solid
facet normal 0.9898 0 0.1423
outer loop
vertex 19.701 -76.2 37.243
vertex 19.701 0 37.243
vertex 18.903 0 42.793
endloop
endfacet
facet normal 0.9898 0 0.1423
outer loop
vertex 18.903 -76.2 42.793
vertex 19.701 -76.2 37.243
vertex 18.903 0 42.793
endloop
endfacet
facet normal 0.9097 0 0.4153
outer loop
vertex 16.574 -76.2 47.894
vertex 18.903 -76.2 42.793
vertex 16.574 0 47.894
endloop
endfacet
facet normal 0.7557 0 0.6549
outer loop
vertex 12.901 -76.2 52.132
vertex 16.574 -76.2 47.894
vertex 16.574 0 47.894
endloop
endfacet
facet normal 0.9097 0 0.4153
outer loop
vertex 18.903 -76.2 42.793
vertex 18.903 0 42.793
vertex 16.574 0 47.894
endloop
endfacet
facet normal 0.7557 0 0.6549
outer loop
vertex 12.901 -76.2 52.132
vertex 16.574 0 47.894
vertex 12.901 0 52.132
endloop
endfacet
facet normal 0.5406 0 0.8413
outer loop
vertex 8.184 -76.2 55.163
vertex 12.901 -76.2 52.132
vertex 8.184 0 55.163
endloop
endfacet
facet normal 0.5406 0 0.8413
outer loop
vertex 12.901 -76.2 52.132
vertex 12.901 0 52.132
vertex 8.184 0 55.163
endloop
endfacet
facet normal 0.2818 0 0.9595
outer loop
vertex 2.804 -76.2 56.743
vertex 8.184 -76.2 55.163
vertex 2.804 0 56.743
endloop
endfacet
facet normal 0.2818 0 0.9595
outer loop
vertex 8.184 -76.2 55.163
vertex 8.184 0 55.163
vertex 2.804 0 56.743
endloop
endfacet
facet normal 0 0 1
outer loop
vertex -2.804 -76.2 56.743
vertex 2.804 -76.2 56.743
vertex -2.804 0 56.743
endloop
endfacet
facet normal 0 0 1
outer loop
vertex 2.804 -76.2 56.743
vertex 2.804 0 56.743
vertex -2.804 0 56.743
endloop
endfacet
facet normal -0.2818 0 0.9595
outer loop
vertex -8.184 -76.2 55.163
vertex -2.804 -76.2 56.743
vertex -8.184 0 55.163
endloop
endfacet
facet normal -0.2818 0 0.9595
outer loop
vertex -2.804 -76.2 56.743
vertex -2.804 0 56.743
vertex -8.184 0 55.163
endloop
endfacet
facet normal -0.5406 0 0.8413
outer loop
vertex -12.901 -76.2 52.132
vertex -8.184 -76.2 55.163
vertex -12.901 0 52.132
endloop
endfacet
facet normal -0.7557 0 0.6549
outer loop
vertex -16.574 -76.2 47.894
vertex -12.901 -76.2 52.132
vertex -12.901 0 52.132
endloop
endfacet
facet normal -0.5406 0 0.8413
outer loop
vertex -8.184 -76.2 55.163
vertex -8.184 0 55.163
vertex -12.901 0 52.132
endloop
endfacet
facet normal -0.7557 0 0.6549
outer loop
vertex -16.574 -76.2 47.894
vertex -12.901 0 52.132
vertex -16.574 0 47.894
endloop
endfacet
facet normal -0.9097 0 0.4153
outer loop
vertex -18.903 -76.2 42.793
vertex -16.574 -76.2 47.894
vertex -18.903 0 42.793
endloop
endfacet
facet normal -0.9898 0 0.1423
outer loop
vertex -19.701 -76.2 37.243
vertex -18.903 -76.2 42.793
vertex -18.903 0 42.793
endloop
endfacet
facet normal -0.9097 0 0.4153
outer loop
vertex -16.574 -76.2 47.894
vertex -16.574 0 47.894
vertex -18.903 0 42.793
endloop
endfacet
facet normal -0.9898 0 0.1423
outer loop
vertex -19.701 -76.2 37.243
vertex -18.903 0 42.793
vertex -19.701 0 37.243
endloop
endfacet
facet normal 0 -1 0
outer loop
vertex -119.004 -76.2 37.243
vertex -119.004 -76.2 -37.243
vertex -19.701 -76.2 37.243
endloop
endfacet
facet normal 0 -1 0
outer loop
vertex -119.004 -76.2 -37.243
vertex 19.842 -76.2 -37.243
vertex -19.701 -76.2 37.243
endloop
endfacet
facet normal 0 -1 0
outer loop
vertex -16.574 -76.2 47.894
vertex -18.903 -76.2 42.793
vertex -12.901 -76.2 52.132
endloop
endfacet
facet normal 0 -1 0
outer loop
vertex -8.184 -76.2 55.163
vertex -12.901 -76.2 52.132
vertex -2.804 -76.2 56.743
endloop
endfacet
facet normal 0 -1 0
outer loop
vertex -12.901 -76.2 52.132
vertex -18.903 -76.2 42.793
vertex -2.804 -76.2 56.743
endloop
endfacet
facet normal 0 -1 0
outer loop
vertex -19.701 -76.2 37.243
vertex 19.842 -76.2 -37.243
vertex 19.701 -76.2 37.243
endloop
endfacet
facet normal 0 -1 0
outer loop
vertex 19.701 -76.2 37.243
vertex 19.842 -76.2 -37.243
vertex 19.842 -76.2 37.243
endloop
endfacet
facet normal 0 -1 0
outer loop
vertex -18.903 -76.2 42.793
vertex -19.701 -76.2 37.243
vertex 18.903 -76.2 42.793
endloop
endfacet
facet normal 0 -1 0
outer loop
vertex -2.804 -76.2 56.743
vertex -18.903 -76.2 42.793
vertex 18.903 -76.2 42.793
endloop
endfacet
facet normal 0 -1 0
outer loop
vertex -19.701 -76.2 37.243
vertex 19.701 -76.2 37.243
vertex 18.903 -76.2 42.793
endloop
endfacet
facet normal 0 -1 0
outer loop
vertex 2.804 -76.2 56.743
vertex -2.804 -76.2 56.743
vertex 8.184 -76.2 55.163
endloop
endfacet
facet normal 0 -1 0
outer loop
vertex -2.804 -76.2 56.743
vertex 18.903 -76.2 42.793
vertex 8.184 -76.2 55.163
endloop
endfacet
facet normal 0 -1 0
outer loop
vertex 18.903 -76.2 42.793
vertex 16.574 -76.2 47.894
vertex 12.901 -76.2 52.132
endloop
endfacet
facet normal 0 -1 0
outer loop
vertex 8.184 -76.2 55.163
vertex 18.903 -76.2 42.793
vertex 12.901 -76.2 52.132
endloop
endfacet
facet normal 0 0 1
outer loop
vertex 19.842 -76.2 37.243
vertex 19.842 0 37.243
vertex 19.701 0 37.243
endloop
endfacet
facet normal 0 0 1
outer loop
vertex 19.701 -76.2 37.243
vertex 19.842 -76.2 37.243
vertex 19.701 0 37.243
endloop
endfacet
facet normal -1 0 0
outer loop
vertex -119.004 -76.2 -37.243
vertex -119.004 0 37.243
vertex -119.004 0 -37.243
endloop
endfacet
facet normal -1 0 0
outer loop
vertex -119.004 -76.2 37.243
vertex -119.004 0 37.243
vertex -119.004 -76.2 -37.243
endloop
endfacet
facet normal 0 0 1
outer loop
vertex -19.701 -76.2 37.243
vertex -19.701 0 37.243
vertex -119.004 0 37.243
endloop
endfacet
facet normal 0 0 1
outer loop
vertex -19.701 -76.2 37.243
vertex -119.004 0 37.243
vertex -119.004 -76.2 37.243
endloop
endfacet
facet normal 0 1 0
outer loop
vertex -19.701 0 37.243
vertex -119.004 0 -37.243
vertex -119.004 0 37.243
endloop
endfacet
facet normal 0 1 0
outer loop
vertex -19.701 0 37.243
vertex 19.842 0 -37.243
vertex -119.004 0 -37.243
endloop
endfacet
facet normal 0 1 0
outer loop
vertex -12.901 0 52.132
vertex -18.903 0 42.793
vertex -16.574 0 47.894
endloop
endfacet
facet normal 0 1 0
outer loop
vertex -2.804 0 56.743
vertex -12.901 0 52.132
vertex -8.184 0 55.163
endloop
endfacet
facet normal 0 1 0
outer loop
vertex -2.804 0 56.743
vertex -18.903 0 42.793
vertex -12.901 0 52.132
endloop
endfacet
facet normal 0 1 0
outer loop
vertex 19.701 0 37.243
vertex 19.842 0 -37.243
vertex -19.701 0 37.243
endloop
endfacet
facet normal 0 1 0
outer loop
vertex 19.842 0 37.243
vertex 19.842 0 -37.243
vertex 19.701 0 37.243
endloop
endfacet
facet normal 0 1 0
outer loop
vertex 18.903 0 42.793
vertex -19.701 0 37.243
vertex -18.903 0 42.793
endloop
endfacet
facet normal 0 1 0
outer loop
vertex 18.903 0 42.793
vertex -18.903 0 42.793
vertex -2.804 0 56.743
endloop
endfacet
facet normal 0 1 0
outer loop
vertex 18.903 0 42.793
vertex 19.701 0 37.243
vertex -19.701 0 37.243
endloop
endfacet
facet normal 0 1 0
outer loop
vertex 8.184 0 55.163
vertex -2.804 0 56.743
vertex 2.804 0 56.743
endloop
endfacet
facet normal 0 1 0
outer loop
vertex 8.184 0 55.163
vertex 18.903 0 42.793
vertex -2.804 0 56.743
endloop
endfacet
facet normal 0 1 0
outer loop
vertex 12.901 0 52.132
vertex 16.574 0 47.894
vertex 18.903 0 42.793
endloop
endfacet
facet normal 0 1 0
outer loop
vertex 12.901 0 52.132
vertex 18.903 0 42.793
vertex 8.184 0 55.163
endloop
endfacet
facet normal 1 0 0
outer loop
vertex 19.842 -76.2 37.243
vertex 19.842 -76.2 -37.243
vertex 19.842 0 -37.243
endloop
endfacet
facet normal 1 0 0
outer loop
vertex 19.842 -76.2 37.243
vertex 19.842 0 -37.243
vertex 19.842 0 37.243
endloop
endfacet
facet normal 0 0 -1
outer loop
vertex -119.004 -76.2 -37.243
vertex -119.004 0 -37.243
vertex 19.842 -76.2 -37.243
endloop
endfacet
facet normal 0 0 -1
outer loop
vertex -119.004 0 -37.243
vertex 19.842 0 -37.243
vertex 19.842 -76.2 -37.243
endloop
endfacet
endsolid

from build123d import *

# Parameters (mm, degrees)
F0_R      = 8.547489
F1_DEPTH  = 76.2
F1_FACE_W = 76.2
F1_FACE_H = 74.485234
F2_DEPTH  = 99.161685


with BuildPart() as f1:
    # F0 (on Front) → F1 (new body)
    with BuildSketch(Plane.XZ):
        with BuildLine():
            Line((-19.700978, 37.242617), (-19.842371, 37.242617))
            Line((-19.842371, 37.242617), (-19.842371, -37.242617))
            Line((-19.842371, -37.242617), (19.842371, -37.242617))
            Line((19.842371, -37.242617), (19.842371, 37.242617))
            Line((19.842371, 37.242617), (19.700978, 37.242617))
            ThreePointArc((19.700978, 37.242617), (0, 56.943595), (-19.700978, 37.242617))
        make_face()
        with Locations((0, 37.242617)):
            Circle(F0_R, mode=Mode.SUBTRACT)
        with Locations((0, 37.242617)):
            Circle(F0_R)
    extrude(amount=F1_DEPTH)

    # F1_face (on face) → F2 (join)
    with BuildSketch(Plane(origin=(-19.842371, -38.1, 0), x_dir=(0, -1, 0), z_dir=(-1, 0, 0))):
        Rectangle(F1_FACE_W, F1_FACE_H)
    extrude(amount=F2_DEPTH)


solid = f1.part
